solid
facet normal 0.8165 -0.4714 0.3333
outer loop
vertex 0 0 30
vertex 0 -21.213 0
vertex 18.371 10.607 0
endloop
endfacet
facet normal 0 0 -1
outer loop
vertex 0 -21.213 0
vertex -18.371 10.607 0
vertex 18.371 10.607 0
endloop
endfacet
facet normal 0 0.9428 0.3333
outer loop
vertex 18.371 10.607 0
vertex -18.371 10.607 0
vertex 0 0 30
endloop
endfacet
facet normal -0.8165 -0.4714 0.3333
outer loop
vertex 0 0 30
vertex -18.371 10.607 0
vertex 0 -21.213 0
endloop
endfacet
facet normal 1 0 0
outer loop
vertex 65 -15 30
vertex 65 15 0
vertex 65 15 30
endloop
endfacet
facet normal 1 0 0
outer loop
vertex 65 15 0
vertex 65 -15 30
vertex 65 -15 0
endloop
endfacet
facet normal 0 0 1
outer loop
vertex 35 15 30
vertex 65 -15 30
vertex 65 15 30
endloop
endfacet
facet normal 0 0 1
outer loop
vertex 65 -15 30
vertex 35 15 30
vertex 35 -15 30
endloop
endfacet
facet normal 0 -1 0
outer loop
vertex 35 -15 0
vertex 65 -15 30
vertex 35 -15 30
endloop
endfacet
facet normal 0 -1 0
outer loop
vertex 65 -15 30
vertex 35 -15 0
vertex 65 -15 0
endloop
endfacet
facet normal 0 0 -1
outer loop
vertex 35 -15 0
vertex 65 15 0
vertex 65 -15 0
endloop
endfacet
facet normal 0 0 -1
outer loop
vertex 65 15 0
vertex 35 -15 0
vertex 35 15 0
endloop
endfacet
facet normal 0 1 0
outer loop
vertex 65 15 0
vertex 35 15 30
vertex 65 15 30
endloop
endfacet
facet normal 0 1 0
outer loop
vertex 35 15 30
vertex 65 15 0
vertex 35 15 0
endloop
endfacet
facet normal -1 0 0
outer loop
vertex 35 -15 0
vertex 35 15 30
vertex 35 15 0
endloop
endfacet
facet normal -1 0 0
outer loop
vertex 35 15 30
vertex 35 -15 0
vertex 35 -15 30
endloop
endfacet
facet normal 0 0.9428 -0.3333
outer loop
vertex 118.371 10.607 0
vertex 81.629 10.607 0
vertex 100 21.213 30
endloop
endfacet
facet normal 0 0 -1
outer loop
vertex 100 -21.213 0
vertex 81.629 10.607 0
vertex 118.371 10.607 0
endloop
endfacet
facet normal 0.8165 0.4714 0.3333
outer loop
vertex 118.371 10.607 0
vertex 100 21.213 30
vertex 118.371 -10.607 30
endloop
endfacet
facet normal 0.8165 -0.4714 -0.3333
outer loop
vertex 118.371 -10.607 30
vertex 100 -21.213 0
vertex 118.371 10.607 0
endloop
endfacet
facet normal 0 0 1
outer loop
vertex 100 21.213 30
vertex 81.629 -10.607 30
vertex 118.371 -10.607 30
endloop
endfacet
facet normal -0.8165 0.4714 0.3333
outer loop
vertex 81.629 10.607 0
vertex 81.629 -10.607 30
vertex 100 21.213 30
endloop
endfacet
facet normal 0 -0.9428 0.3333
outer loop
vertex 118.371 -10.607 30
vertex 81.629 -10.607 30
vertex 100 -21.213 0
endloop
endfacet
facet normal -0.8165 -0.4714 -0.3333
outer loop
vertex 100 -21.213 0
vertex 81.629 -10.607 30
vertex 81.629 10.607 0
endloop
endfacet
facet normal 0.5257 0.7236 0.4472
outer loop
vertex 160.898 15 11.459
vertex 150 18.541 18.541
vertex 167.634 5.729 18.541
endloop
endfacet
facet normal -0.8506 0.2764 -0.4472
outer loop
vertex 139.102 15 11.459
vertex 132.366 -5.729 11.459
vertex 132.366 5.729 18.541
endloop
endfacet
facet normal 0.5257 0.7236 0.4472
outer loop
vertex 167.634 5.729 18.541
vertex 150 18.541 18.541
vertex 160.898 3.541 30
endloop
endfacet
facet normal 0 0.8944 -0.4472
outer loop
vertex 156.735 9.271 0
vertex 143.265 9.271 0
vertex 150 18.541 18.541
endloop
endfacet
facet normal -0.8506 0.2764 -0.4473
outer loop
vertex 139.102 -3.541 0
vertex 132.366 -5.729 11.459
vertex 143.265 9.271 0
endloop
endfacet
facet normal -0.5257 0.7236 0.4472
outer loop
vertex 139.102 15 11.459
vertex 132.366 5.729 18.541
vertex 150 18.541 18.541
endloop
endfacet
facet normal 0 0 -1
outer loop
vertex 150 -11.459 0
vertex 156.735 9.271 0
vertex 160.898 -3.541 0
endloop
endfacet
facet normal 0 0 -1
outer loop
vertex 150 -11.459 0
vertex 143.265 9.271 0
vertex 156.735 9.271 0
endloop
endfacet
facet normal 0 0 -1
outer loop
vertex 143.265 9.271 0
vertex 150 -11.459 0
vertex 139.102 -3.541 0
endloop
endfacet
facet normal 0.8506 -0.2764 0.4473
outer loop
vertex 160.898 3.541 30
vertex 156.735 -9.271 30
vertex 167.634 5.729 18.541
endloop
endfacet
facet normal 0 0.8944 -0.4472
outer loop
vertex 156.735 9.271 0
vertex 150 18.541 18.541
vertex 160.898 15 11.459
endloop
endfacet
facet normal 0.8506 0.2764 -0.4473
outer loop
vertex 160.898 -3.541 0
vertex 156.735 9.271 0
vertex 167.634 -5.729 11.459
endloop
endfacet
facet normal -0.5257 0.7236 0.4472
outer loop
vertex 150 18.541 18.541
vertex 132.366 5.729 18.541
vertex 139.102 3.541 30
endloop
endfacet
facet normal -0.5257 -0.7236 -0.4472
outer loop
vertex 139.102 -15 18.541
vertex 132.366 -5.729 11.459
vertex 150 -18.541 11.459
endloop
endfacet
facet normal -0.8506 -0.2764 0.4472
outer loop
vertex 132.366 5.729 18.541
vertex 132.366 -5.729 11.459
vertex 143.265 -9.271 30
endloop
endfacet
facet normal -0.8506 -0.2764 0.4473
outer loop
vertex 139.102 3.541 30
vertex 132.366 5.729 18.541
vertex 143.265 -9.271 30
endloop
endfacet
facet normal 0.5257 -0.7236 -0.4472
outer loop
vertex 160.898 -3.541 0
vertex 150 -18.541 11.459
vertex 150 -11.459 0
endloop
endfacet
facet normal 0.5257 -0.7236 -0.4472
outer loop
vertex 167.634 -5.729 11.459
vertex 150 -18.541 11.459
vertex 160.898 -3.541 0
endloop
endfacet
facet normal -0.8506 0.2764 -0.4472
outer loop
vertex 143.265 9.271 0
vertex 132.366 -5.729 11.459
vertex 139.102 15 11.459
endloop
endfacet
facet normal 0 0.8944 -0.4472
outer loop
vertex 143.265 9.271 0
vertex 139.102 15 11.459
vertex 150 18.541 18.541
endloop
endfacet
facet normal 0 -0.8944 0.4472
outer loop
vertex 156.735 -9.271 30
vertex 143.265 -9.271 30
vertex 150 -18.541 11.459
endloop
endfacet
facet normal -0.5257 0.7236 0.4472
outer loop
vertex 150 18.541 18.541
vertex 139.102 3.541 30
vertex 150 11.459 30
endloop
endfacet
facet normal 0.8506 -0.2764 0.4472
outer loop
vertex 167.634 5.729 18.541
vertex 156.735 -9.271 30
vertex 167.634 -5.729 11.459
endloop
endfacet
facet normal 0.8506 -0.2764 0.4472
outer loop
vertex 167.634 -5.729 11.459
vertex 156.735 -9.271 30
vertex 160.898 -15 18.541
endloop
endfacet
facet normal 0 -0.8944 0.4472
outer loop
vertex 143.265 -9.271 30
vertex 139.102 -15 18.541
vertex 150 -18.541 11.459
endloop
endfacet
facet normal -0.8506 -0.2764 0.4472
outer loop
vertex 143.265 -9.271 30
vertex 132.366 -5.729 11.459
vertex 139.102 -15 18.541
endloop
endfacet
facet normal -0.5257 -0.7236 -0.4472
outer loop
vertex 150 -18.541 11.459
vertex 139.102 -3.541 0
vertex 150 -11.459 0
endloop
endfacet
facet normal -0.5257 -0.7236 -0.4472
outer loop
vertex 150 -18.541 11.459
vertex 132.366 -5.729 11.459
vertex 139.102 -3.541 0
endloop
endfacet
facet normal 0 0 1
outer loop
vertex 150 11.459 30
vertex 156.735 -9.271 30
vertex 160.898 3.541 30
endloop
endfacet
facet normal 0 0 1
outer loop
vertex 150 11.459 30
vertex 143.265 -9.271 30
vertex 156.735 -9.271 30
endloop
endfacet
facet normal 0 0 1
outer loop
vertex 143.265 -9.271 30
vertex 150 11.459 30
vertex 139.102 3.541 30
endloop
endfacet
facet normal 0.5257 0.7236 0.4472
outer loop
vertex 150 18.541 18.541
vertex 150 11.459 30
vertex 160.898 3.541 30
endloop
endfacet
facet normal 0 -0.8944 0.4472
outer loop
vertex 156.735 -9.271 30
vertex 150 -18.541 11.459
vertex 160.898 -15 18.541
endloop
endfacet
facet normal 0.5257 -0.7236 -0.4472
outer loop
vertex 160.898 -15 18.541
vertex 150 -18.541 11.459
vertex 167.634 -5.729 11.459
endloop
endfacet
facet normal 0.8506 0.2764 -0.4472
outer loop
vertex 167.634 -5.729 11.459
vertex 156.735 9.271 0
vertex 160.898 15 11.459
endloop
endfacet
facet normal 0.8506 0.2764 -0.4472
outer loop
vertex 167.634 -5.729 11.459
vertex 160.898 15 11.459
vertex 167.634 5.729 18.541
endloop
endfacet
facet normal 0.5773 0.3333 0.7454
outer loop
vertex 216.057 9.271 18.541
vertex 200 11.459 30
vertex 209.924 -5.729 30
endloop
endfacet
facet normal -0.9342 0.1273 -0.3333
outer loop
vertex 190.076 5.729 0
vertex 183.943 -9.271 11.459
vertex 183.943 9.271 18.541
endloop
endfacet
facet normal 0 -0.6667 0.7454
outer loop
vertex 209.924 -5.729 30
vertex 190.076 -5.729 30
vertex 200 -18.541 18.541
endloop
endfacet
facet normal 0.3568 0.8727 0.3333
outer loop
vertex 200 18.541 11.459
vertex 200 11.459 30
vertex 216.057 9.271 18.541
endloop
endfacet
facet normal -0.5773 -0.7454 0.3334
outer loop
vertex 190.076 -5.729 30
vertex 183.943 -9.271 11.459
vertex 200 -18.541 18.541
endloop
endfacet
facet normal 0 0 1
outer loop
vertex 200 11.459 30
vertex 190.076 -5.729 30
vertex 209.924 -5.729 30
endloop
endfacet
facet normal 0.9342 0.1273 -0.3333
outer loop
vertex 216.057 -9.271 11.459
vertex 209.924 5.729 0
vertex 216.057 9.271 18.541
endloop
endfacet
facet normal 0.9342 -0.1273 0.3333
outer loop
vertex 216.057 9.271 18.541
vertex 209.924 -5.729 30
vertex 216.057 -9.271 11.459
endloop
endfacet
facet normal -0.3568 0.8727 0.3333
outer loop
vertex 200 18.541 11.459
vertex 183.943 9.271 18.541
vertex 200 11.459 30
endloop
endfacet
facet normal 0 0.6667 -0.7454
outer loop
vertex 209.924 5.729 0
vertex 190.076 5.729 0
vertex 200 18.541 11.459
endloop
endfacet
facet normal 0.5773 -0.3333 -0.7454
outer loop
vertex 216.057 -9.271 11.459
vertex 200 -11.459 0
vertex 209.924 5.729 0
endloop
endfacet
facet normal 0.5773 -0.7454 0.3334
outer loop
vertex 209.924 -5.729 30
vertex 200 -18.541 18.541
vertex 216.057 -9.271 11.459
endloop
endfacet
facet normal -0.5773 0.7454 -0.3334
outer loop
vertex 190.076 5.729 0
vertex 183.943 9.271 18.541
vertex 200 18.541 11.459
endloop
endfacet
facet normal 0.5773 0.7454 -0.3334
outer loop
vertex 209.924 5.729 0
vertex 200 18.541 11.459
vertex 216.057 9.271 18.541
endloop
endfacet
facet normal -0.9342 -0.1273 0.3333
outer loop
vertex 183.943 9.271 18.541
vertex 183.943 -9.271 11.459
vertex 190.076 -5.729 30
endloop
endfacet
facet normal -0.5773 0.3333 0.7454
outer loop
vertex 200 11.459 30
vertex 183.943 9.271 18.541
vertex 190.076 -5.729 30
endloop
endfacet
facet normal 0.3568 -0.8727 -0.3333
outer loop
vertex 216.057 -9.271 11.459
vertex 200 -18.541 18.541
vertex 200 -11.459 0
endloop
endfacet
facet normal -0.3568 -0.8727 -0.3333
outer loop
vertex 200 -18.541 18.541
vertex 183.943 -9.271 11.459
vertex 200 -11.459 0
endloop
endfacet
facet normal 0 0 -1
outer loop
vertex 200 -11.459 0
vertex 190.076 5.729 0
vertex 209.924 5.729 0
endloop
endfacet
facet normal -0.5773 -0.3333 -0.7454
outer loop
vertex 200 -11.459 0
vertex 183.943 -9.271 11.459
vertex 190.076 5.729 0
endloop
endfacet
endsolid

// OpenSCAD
// file: IcosahedronRegular.scad
// Regular Icosahedron
// (C) @oblomobka - 2023.06
// GPL license

 /* **CUSTOMIZER VARIABLES** */
// Edge
edge = 30; //[10:100]
// Center of the solid or stand over a face
position = "Center"; //["Center", "Face"]

module IcosahedronRegular ( edge = 30, position = "Face"){ 
    // Constants
    phi = (1+sqrt(5))/2; // Golden ratio = 1,618...
    
    // Invariants
    diAngleIcosahedron = acos(-sqrt(5)/3); // dihedral angle of Icosahedron = 138,1897...
    
    // Relations
    rCirIcosahedron = sqrt(phi*sqrt(5))/2; // radius of a circumscribed sphere for edge = 1 / =0,951...
    rInsIcosahedron = phi^2/(2*sqrt(3)); // radius of a inscribed sphere for edge = 1 / =0,7558...
    rMidIcosahedron = phi/2; // Midradius, which touches the middle of each edge / =0,809...
    
    // Variables
    // longSide (a): shortSide (b) depicts the 3 rectangles (one in each plane (xy - xz - yz) to depict the 12 vertices of Icosahedron
    a = edge*phi/2;
    b = edge/2;
    
    // Definition of points and faces V = 12 / F = 20
    // 12 vertices -> Even permutations of ( +-phi, +-1, 0)
    Ipoints = [ 
        // Build 3 rectangles on plane XY/XZ/YZ
        [ +a, +b, 0], [ -a, +b, 0], [ +a, -b, 0], [ -a, -b, 0],         // XY [  0,  1,  2,  3]
        [ +b, 0, +a], [ -b, 0, +a], [ +b, 0, -a], [ -b, 0, -a],         // XZ [  4,  5,  6,  7]  
        [ 0, +a, +b], [ 0, -a, +b], [ 0, +a, -b], [ 0, -a, -b]          // YZ [  8,  9, 10, 11]
        ];
         
    Ifaces = [
        // Build 8 triangles. One triangle per octant
        [  0,  4,  8], [  1,  8,  5], [  9,  4,  2], [  3,  5,  9],     // UP
        [  0, 10,  6], [  1,  7, 10], [  2,  6, 11], [  7,  3, 11],     // DOWN
        // Pairs of triangles on shortSide of rectangles
        [  0,  2,  4], [  0,  6,  2], [  1,  5,  3], [  1,  3,  7],     // XY
        [  5,  4,  9], [  5,  8,  4], [  6,  7, 11], [  7,  6, 10],     // XZ
        [  8, 10,  0], [  8,  1, 10], [ 11,  9,  2], [  3,  9, 11]      // YZ
        ];
    
    // Polyhedron stands on xy plane centered on the center of the face or centered on the center of polyhedron
    if ( position == "Face"){
        translate ([ 0, 0, edge*rInsIcosahedron])
            rotate ([ 90-diAngleIcosahedron/2, 0, 0])
                polyhedron ( Ipoints, Ifaces);}
    else if ( position == "Center") {
        polyhedron ( Ipoints, Ifaces);} 
}

/* **RENDERING OF SOLIDS** */ 
IcosahedronRegular ( edge = edge, position = position);
// file: DodecahedronRegular.scad
// Regular Dodecahedron
// (C) @oblomobka - 2023.05
// GPL license

/* **CUSTOMIZER VARIABLES** */
// Edge
edge = 30; //[10:100]
// Center of the solid or stand over a face
position = "Center"; //["Center", "Face"]

/* **MODULES** */
module DodecahedronRegular ( edge = 30, position = "Face"){
    
    // Constants
    phi = (1+sqrt(5))/2; // Golden ratio = 1,618...
    
    // Invariants
    diAngleDodecahedron = acos(-1/sqrt(5))/*atan(1/phi)*/; // dihedral angle of Dodecahedron = 116,56505...
    
    // Relations
    rCirDodecahedron = sqrt(3)*phi/2; // Radius of a circumscribed sphere for edge = 1 / =1,401...
    rInsDodecahedron = phi^2/(2*sqrt(3-phi)); // radius of a inscribed sphere for edge = 1 / =1,1135...
    rMidDodecahedron = phi^2/2; // Midradius, which touches the middle of each edge / =1,309...
    
    // Variables
    diagonal = phi; // x depicts the edge of cube inscrit in the dodecahedron, that is the lenght of the diagonal of regular pentagon
    a = edge*diagonal/2; // to depicts the coordinates of cube inscrit in a pentagon center in (0,0,0) - 8 vertices
    // Even permutations (+-phi, +-1/phi, 0) for the inscrit cube (+-1, +-1, +-1) / ratio longside : shortside = phi : (1/phi) -> phi^2
    b = (edge*phi^2)/2;     // long side of the rectangle - equivalente to phi
    c = edge/2;             // short side of the rectangle - equivalente to 1/phi
    
    // Definition of points and faces V = 20 / F = 12
    Dpoints = [
        // Build the cube inscrit in the Dodecahedron
        [ +a, +a, +a], [ -a, +a, +a], [ +a, -a, +a], [ -a, -a, +a],     // UP       [  0,  1,  2,  3]
        [ +a, +a, -a], [ -a, +a, -a], [ +a, -a, -a], [ -a, -a, -a],     // DOWN     [  4,  5,  6,  7]
        // Even permutations, every line draw a rectangule
        [ +b, +c, 0], [ -b, +c, 0], [ +b, -c, 0], [ -b, -c, 0],         // XY       [  8,  9, 10, 11]
        [ +c, 0, +b], [ +c, 0, -b], [ -c, 0, +b], [ -c, 0, -b],         // XZ       [ 12, 13, 14, 15]
        [ 0, +b, +c], [ 0, -b, +c], [ 0, +b, -c], [ 0, -b, -c]          // YZ       [ 16, 17, 18, 19]
        ];
         
    Dfaces = [
        [  0, 16, 18,  4,  8], [  1,  9,  5, 18, 16], [  2, 10,  6, 19, 17], [  3, 17, 19,  7, 11],  // Edges XY
        [  0,  8, 10,  2, 12], [  1, 14,  3, 11,  9], [  4, 13,  6, 10,  8], [  5,  9, 11,  7, 15],  // Edges XZ
        [  0, 12, 14,  1, 16], [  2, 17,  3, 14, 12], [  4, 18,  5, 15, 13], [  6, 13, 15,  7, 19]   // Edges YZ
        ];
    
    // Polyhedron stands on xy plane centered on the center of the face or centered on the center of polyhedron
    if ( position == "Face"){
        translate ([ 0, 0, edge*rInsDodecahedron])
            rotate ([ 90-diAngleDodecahedron/2, 0, 0])
                    polyhedron ( Dpoints, Dfaces);}
                    
    else if ( position == "Center") {
        polyhedron ( Dpoints, Dfaces);
            }         
        } 

/* **RENDERING** */
DodecahedronRegular ( edge = edge, position = position);
// file: Cube.scad
// Cube
// (C) @oblomobka - 2023.05
// GPL license

/* **CUSTOMIZER VARIABLES** */
// Edge
edge = 30; //[10:100]
// Center of the solid or stand over a face
position = "Center"; //["Center", "Face"]

/* **MODULES** */
module Cube ( edge = 30, position = "Face"){
    
    // Invariants
    diAngleCube = 90; // dihedral angle of cube
    
    // Relations
    rCirCube = sqrt(3)/2; // radius of a circumscribed sphere for edge = 1 / = 1,061...
    rInsCube = 1/2; // radius of a inscribed sphere for edge = 1 / = 0,5
    rMidCube = 1/sqrt(2); // Midradius, which touches the middle of each edge / =0,707...
    
    // Variables
    a = edge/2;
    
    // Definition of points and faces V = 8 / F = 6
    Cpoints = [
        [ +a, +a, +a], [ -a, +a, +a], [ +a, -a, +a], [ -a, -a, +a],     // UP       [  0,  1,  2,  3]
        [ +a, +a, -a], [ -a, +a, -a], [ +a, -a, -a], [ -a, -a, -a],     // DOWN     [  4,  5,  6,  7]
        ];
    
    Cfaces = [
        [ 0, 2, 3, 1], [ 4, 5, 7, 6],       // XY
        [ 0, 1, 5, 4], [ 2, 6, 7, 3],       // XZ
        [ 0, 4, 6, 2], [ 1, 3, 7, 5]        // YZ
        ];
    
    // Polyhedron stands on xy plane centered on the center of the face or centered on the center of polyhedron
    if ( position == "Face"){
        translate([ 0, 0, a])
            polyhedron( Cpoints, Cfaces);}
    else if ( position == "Center") {
        polyhedron( Cpoints, Cfaces);} 
}


/* **RENDERING OF SOLIDS** */ 
Cube ( edge = edge, position = position);
// file: OctahedronRegular.scad
// Regular Octahedron
// (C) @oblomobka - 2023.06
// GPL license

/* **CUSTOMIZER VARIABLES** */
// Edge
edge = 30; //[10:100]
// Center of the solid or stand over a face
position = "Center"; //["Center", "Face"]

/* **MODULES** */
module OctahedronRegular ( edge = 30, position = "Face"){ 
    
    // Invariants
    diAngleOctahedron = acos(-1/3); // dihedral angle of octahedron = 109,471
    
    // Relations
    rCirOctahedron = 1/sqrt(2); // radius of a circumscribed sphere for edge = 1 / = 0,707..
    rInsOctahedron = sqrt(6)/6; // radius of a inscribed sphere for edge = 1 / = 0,408
    rMidOctahedron = 1/2; // Midradius, which touches the middle of each edge / =0,5
    
    // Variables
    a = edge/sqrt(2);
    
    // Definition of points and faces V = 6 / F = 8
    Opoints = [
        [ +a, 0, 0], [ 0, +a, 0], [ 0, 0, +a],
        [ -a, 0, 0], [ 0, -a, 0], [ 0, 0, -a]
        ];
    
    Ofaces = [
        [ 0, 2, 1], [ 0, 4, 2], [ 1, 2, 3], [ 3, 2, 4],     // UP faces
        [ 0, 1, 5], [ 0, 5, 4], [ 3, 4, 5], [ 1, 3, 5]      // DOWN faces
        ];
    
    // Polyhedron stands on xy plane centered on the center of the face or centered on the center of polyhedron
    if ( position == "Face"){
        translate ([ 0, 0, edge*rInsOctahedron])
            rotate ([ -diAngleOctahedron/2, 0, 0])    
                rotate ([ 0, 0, 45])
                    polyhedron ( Opoints, Ofaces);}
                    
    else if ( position == "Center") {
        polyhedron ( Opoints, Ofaces);} 
}

/* **RENDERING OF SOLIDS** */ 
OctahedronRegular ( edge = edge, position = position);
// file: TetrahedronRegular.scad
// Regular Tetrahedron
// (C) @oblomobka - 2023.05
// GPL license

/* **CUSTOMIZER VARIABLES** */
// Edge
edge = 30; //[10:100]
// Center of the solid or stand over a face
position = "Center"; //["Center", "Face"]

/* **MODULES** */
module TetrahedronRegular ( edge = 30, position = "Face"){ 
    
    // Invariants
    diAngleTetrahedron = acos(1/3); // dihedral angle of tetrahedron = 70.529
    
    // Relations
    rCirTetrahedron = sqrt(6)/4; // radius of a circumscribed sphere for edge = 1 / = 0,612...
    rInsTetrahedron = 1/sqrt(24); // radius of a inscribed sphere for edge = 1 / = 0,204
    rMidTetrahedron = 1/sqrt(8); // Midradius, which touches the middle of each edge / =354...
    hTetrahedron = sqrt(6)/3;
    
    // Variables
    a = edge/(2*sqrt(2));
    
    // Definition of points and faces V = 4 / F = 4
    Tpoints = [
        // Half of the vertices of a cube
        [ +a, +a, +a], [ -a, -a, +a],      // UP       [  0,  1]
        [ -a, +a, -a], [ +a, -a, -a],      // DOWN     [  2,  3]
        ];
    
    Tfaces = [
        [ 0, 3, 1], [ 0, 2, 3], [ 0, 1, 2], [ 1, 3, 2]
        ];
    
    // Polyhedron stands on xy plane centered on the center of the face or centered on the center of polyhedron
    if ( position == "Face"){
        translate ([ 0, 0, edge*(hTetrahedron-rCirTetrahedron)])
            rotate ([ 90-diAngleTetrahedron/2, 0, 0])
                rotate ([ 0, 0, 45])
                    polyhedron ( Tpoints, Tfaces);}
    else if ( position == "Center") {
        polyhedron ( Tpoints, Tfaces);} 
}


/* **RENDERING OF SOLIDS** */ 
TetrahedronRegular ( edge = edge, position = position);
// main file
// PlatonicSolids
// (C) @oblomobka - 2023.06
// GPL license
/*  LIST OF PLATONIC SOLIDS
    -----------------------                        
    + Tetrahedron
    + Octahedron
    + Cube
    + Dodecahedron
    + Icosahedron
*/


/* **CUSTOMIZER VARIABLES** */
// Type of Platonic Solid
type = "Dodecahedron"; //["Tetrahedron", "Cube", "Octahedron", "Dodecahedron", "Icosahedron"]
// Size of the solid
size = 30; //[10:100]
// Parameter on which the solid is built
accordingTo = "height"; //["edge", "height", "radioCircumscribed", "radioInscribed"]

/* **External files** */
use <TetrahedronRegular.scad>
use <OctahedronRegular.scad>
use <Cube.scad>
use <DodecahedronRegular.scad>
use <IcosahedronRegular.scad>

// This module is able to render any Platonic Solid, defined by its edge, height, radio of circumscribed sphere and radio of inscribed sphere
module PlatonicSolids ( type = "Dodecahedron", size = 30, accordingTo = "edge"){
    
    phi = (1+sqrt(5))/2; // Golden ratio = 1,618...
    
    if ( accordingTo == "edge"){
        if ( type == "Tetrahedron" || type == "T" ){
            TetrahedronRegular ( size, position = "Face");
        }
                if ( type == "Cube" || type == "C") {
                    Cube ( size, position = "Face");
                }
                        if( type == "Octahedron" || type == "O") {
                            OctahedronRegular ( size, position = "Face");
                        }
                                if ( type == "Dodecahedron" || type == "D") {
                                    DodecahedronRegular ( size, position = "Face");
                                }
                                        if ( type == "Icosahedron" || type == "I") {
                                            IcosahedronRegular ( size, position = "Face");
                                        }
    }
        
    if ( accordingTo == "height"){
                if ( type == "Tetrahedron" || type == "T"){
                    TetrahedronRegular ( size/(sqrt(6)/3), position = "Face");
                }
                        if ( type == "Cube" || type == "C") {
                            Cube ( size/1, position = "Face");
                        }
                                if ( type == "Octahedron" || type == "O") {
                                    OctahedronRegular ( size/(sqrt(6)/3), position = "Face");
                                }
                                        if ( type == "Dodecahedron" || type == "D") {
                                            DodecahedronRegular ( size/(phi^2/sqrt(3-phi)), position = "Face");
                                        }
                                                if ( type == "Icosahedron" || type == "I") {
                                                    IcosahedronRegular ( size/(phi^2/sqrt(3)), position = "Face");
                                                }
     }
    if (accordingTo == "radioCircumscribed"){
                if ( type == "Tetrahedron" || type == "T"){
                    TetrahedronRegular ( size/(sqrt(6)/4), position = "Center");
                    color( "grey", 0.1 ) { sphere(size); }
                }
                        if ( type == "Cube" || type == "C") {
                            Cube (size/(sqrt(3)/2), position = "Center");
                            color ( "grey", 0.1 ) { sphere(size); }
                        }
                                if (type == "Octahedron" || type == "O") {
                                    OctahedronRegular ( size/(1/sqrt(2)), position = "Center");
                                    color ( "grey", 0.1 ) { sphere(size); }
                                }
                                        if ( type == "Dodecahedron" || type == "D") {
                                            DodecahedronRegular ( size/(sqrt(3)*phi/2), position = "Center");
                                            color ( "grey", 0.1 ) { sphere(size); }
                                        }
                                                if ( type == "Icosahedron" || type == "I") {
                                                    IcosahedronRegular ( size/(sqrt(phi*sqrt(5))/2), position ="Center" );
                                                    color ( "grey", 0.1 ) { sphere(size); }
                                                }
    }
    if ( accordingTo == "radioInscribed" ){
                if ( type == "Tetrahedron" || type == "T"){
                    sphere ( size);
                    color ( "orange", 0.4 ) { TetrahedronRegular ( size/(1/sqrt(24)), position = "Center");}                 
                }
                        if ( type == "Cube" || type == "C") {
                            sphere ( size);
                            color ( "orange", 0.4 ) { Cube (size/(1/2), position = "Center");}
                        }
                                if( type == "Octahedron" || type == "O") {
                                    sphere ( size);
                                    color ( "orange", 0.4 ) { OctahedronRegular ( size/(sqrt(6)/6), position = "Center");}
                                }
                                        if ( type == "Dodecahedron" || type == "D") {
                                            sphere ( size);
                                            color ( "orange", 0.4 ) { DodecahedronRegular ( size/(phi^2/(2*sqrt(3-phi))), position = "Center");}
                                        }
                                                if ( type == "Icosahedron" || type == "I") {
                                                    sphere ( size);
                                                    color ( "orange", 0.4 ) { IcosahedronRegular ( size/(phi^2/(2*sqrt(3))), position = "Center");}
                                                }
    }     
}
/* **RENDERING OF SOLIDS** */
matrix = 50;

translate([matrix*0,0,0])
    PlatonicSolids ( "T", size, accordingTo);
translate([matrix*1,0,0])
    PlatonicSolids ( "C", size, accordingTo);
translate([matrix*2,0,0])
    PlatonicSolids ( "O", size, accordingTo);
translate([matrix*3,0,0])
    PlatonicSolids ( "D", size, accordingTo);
translate([matrix*4,0,0])
    PlatonicSolids ( "I", size, accordingTo);
